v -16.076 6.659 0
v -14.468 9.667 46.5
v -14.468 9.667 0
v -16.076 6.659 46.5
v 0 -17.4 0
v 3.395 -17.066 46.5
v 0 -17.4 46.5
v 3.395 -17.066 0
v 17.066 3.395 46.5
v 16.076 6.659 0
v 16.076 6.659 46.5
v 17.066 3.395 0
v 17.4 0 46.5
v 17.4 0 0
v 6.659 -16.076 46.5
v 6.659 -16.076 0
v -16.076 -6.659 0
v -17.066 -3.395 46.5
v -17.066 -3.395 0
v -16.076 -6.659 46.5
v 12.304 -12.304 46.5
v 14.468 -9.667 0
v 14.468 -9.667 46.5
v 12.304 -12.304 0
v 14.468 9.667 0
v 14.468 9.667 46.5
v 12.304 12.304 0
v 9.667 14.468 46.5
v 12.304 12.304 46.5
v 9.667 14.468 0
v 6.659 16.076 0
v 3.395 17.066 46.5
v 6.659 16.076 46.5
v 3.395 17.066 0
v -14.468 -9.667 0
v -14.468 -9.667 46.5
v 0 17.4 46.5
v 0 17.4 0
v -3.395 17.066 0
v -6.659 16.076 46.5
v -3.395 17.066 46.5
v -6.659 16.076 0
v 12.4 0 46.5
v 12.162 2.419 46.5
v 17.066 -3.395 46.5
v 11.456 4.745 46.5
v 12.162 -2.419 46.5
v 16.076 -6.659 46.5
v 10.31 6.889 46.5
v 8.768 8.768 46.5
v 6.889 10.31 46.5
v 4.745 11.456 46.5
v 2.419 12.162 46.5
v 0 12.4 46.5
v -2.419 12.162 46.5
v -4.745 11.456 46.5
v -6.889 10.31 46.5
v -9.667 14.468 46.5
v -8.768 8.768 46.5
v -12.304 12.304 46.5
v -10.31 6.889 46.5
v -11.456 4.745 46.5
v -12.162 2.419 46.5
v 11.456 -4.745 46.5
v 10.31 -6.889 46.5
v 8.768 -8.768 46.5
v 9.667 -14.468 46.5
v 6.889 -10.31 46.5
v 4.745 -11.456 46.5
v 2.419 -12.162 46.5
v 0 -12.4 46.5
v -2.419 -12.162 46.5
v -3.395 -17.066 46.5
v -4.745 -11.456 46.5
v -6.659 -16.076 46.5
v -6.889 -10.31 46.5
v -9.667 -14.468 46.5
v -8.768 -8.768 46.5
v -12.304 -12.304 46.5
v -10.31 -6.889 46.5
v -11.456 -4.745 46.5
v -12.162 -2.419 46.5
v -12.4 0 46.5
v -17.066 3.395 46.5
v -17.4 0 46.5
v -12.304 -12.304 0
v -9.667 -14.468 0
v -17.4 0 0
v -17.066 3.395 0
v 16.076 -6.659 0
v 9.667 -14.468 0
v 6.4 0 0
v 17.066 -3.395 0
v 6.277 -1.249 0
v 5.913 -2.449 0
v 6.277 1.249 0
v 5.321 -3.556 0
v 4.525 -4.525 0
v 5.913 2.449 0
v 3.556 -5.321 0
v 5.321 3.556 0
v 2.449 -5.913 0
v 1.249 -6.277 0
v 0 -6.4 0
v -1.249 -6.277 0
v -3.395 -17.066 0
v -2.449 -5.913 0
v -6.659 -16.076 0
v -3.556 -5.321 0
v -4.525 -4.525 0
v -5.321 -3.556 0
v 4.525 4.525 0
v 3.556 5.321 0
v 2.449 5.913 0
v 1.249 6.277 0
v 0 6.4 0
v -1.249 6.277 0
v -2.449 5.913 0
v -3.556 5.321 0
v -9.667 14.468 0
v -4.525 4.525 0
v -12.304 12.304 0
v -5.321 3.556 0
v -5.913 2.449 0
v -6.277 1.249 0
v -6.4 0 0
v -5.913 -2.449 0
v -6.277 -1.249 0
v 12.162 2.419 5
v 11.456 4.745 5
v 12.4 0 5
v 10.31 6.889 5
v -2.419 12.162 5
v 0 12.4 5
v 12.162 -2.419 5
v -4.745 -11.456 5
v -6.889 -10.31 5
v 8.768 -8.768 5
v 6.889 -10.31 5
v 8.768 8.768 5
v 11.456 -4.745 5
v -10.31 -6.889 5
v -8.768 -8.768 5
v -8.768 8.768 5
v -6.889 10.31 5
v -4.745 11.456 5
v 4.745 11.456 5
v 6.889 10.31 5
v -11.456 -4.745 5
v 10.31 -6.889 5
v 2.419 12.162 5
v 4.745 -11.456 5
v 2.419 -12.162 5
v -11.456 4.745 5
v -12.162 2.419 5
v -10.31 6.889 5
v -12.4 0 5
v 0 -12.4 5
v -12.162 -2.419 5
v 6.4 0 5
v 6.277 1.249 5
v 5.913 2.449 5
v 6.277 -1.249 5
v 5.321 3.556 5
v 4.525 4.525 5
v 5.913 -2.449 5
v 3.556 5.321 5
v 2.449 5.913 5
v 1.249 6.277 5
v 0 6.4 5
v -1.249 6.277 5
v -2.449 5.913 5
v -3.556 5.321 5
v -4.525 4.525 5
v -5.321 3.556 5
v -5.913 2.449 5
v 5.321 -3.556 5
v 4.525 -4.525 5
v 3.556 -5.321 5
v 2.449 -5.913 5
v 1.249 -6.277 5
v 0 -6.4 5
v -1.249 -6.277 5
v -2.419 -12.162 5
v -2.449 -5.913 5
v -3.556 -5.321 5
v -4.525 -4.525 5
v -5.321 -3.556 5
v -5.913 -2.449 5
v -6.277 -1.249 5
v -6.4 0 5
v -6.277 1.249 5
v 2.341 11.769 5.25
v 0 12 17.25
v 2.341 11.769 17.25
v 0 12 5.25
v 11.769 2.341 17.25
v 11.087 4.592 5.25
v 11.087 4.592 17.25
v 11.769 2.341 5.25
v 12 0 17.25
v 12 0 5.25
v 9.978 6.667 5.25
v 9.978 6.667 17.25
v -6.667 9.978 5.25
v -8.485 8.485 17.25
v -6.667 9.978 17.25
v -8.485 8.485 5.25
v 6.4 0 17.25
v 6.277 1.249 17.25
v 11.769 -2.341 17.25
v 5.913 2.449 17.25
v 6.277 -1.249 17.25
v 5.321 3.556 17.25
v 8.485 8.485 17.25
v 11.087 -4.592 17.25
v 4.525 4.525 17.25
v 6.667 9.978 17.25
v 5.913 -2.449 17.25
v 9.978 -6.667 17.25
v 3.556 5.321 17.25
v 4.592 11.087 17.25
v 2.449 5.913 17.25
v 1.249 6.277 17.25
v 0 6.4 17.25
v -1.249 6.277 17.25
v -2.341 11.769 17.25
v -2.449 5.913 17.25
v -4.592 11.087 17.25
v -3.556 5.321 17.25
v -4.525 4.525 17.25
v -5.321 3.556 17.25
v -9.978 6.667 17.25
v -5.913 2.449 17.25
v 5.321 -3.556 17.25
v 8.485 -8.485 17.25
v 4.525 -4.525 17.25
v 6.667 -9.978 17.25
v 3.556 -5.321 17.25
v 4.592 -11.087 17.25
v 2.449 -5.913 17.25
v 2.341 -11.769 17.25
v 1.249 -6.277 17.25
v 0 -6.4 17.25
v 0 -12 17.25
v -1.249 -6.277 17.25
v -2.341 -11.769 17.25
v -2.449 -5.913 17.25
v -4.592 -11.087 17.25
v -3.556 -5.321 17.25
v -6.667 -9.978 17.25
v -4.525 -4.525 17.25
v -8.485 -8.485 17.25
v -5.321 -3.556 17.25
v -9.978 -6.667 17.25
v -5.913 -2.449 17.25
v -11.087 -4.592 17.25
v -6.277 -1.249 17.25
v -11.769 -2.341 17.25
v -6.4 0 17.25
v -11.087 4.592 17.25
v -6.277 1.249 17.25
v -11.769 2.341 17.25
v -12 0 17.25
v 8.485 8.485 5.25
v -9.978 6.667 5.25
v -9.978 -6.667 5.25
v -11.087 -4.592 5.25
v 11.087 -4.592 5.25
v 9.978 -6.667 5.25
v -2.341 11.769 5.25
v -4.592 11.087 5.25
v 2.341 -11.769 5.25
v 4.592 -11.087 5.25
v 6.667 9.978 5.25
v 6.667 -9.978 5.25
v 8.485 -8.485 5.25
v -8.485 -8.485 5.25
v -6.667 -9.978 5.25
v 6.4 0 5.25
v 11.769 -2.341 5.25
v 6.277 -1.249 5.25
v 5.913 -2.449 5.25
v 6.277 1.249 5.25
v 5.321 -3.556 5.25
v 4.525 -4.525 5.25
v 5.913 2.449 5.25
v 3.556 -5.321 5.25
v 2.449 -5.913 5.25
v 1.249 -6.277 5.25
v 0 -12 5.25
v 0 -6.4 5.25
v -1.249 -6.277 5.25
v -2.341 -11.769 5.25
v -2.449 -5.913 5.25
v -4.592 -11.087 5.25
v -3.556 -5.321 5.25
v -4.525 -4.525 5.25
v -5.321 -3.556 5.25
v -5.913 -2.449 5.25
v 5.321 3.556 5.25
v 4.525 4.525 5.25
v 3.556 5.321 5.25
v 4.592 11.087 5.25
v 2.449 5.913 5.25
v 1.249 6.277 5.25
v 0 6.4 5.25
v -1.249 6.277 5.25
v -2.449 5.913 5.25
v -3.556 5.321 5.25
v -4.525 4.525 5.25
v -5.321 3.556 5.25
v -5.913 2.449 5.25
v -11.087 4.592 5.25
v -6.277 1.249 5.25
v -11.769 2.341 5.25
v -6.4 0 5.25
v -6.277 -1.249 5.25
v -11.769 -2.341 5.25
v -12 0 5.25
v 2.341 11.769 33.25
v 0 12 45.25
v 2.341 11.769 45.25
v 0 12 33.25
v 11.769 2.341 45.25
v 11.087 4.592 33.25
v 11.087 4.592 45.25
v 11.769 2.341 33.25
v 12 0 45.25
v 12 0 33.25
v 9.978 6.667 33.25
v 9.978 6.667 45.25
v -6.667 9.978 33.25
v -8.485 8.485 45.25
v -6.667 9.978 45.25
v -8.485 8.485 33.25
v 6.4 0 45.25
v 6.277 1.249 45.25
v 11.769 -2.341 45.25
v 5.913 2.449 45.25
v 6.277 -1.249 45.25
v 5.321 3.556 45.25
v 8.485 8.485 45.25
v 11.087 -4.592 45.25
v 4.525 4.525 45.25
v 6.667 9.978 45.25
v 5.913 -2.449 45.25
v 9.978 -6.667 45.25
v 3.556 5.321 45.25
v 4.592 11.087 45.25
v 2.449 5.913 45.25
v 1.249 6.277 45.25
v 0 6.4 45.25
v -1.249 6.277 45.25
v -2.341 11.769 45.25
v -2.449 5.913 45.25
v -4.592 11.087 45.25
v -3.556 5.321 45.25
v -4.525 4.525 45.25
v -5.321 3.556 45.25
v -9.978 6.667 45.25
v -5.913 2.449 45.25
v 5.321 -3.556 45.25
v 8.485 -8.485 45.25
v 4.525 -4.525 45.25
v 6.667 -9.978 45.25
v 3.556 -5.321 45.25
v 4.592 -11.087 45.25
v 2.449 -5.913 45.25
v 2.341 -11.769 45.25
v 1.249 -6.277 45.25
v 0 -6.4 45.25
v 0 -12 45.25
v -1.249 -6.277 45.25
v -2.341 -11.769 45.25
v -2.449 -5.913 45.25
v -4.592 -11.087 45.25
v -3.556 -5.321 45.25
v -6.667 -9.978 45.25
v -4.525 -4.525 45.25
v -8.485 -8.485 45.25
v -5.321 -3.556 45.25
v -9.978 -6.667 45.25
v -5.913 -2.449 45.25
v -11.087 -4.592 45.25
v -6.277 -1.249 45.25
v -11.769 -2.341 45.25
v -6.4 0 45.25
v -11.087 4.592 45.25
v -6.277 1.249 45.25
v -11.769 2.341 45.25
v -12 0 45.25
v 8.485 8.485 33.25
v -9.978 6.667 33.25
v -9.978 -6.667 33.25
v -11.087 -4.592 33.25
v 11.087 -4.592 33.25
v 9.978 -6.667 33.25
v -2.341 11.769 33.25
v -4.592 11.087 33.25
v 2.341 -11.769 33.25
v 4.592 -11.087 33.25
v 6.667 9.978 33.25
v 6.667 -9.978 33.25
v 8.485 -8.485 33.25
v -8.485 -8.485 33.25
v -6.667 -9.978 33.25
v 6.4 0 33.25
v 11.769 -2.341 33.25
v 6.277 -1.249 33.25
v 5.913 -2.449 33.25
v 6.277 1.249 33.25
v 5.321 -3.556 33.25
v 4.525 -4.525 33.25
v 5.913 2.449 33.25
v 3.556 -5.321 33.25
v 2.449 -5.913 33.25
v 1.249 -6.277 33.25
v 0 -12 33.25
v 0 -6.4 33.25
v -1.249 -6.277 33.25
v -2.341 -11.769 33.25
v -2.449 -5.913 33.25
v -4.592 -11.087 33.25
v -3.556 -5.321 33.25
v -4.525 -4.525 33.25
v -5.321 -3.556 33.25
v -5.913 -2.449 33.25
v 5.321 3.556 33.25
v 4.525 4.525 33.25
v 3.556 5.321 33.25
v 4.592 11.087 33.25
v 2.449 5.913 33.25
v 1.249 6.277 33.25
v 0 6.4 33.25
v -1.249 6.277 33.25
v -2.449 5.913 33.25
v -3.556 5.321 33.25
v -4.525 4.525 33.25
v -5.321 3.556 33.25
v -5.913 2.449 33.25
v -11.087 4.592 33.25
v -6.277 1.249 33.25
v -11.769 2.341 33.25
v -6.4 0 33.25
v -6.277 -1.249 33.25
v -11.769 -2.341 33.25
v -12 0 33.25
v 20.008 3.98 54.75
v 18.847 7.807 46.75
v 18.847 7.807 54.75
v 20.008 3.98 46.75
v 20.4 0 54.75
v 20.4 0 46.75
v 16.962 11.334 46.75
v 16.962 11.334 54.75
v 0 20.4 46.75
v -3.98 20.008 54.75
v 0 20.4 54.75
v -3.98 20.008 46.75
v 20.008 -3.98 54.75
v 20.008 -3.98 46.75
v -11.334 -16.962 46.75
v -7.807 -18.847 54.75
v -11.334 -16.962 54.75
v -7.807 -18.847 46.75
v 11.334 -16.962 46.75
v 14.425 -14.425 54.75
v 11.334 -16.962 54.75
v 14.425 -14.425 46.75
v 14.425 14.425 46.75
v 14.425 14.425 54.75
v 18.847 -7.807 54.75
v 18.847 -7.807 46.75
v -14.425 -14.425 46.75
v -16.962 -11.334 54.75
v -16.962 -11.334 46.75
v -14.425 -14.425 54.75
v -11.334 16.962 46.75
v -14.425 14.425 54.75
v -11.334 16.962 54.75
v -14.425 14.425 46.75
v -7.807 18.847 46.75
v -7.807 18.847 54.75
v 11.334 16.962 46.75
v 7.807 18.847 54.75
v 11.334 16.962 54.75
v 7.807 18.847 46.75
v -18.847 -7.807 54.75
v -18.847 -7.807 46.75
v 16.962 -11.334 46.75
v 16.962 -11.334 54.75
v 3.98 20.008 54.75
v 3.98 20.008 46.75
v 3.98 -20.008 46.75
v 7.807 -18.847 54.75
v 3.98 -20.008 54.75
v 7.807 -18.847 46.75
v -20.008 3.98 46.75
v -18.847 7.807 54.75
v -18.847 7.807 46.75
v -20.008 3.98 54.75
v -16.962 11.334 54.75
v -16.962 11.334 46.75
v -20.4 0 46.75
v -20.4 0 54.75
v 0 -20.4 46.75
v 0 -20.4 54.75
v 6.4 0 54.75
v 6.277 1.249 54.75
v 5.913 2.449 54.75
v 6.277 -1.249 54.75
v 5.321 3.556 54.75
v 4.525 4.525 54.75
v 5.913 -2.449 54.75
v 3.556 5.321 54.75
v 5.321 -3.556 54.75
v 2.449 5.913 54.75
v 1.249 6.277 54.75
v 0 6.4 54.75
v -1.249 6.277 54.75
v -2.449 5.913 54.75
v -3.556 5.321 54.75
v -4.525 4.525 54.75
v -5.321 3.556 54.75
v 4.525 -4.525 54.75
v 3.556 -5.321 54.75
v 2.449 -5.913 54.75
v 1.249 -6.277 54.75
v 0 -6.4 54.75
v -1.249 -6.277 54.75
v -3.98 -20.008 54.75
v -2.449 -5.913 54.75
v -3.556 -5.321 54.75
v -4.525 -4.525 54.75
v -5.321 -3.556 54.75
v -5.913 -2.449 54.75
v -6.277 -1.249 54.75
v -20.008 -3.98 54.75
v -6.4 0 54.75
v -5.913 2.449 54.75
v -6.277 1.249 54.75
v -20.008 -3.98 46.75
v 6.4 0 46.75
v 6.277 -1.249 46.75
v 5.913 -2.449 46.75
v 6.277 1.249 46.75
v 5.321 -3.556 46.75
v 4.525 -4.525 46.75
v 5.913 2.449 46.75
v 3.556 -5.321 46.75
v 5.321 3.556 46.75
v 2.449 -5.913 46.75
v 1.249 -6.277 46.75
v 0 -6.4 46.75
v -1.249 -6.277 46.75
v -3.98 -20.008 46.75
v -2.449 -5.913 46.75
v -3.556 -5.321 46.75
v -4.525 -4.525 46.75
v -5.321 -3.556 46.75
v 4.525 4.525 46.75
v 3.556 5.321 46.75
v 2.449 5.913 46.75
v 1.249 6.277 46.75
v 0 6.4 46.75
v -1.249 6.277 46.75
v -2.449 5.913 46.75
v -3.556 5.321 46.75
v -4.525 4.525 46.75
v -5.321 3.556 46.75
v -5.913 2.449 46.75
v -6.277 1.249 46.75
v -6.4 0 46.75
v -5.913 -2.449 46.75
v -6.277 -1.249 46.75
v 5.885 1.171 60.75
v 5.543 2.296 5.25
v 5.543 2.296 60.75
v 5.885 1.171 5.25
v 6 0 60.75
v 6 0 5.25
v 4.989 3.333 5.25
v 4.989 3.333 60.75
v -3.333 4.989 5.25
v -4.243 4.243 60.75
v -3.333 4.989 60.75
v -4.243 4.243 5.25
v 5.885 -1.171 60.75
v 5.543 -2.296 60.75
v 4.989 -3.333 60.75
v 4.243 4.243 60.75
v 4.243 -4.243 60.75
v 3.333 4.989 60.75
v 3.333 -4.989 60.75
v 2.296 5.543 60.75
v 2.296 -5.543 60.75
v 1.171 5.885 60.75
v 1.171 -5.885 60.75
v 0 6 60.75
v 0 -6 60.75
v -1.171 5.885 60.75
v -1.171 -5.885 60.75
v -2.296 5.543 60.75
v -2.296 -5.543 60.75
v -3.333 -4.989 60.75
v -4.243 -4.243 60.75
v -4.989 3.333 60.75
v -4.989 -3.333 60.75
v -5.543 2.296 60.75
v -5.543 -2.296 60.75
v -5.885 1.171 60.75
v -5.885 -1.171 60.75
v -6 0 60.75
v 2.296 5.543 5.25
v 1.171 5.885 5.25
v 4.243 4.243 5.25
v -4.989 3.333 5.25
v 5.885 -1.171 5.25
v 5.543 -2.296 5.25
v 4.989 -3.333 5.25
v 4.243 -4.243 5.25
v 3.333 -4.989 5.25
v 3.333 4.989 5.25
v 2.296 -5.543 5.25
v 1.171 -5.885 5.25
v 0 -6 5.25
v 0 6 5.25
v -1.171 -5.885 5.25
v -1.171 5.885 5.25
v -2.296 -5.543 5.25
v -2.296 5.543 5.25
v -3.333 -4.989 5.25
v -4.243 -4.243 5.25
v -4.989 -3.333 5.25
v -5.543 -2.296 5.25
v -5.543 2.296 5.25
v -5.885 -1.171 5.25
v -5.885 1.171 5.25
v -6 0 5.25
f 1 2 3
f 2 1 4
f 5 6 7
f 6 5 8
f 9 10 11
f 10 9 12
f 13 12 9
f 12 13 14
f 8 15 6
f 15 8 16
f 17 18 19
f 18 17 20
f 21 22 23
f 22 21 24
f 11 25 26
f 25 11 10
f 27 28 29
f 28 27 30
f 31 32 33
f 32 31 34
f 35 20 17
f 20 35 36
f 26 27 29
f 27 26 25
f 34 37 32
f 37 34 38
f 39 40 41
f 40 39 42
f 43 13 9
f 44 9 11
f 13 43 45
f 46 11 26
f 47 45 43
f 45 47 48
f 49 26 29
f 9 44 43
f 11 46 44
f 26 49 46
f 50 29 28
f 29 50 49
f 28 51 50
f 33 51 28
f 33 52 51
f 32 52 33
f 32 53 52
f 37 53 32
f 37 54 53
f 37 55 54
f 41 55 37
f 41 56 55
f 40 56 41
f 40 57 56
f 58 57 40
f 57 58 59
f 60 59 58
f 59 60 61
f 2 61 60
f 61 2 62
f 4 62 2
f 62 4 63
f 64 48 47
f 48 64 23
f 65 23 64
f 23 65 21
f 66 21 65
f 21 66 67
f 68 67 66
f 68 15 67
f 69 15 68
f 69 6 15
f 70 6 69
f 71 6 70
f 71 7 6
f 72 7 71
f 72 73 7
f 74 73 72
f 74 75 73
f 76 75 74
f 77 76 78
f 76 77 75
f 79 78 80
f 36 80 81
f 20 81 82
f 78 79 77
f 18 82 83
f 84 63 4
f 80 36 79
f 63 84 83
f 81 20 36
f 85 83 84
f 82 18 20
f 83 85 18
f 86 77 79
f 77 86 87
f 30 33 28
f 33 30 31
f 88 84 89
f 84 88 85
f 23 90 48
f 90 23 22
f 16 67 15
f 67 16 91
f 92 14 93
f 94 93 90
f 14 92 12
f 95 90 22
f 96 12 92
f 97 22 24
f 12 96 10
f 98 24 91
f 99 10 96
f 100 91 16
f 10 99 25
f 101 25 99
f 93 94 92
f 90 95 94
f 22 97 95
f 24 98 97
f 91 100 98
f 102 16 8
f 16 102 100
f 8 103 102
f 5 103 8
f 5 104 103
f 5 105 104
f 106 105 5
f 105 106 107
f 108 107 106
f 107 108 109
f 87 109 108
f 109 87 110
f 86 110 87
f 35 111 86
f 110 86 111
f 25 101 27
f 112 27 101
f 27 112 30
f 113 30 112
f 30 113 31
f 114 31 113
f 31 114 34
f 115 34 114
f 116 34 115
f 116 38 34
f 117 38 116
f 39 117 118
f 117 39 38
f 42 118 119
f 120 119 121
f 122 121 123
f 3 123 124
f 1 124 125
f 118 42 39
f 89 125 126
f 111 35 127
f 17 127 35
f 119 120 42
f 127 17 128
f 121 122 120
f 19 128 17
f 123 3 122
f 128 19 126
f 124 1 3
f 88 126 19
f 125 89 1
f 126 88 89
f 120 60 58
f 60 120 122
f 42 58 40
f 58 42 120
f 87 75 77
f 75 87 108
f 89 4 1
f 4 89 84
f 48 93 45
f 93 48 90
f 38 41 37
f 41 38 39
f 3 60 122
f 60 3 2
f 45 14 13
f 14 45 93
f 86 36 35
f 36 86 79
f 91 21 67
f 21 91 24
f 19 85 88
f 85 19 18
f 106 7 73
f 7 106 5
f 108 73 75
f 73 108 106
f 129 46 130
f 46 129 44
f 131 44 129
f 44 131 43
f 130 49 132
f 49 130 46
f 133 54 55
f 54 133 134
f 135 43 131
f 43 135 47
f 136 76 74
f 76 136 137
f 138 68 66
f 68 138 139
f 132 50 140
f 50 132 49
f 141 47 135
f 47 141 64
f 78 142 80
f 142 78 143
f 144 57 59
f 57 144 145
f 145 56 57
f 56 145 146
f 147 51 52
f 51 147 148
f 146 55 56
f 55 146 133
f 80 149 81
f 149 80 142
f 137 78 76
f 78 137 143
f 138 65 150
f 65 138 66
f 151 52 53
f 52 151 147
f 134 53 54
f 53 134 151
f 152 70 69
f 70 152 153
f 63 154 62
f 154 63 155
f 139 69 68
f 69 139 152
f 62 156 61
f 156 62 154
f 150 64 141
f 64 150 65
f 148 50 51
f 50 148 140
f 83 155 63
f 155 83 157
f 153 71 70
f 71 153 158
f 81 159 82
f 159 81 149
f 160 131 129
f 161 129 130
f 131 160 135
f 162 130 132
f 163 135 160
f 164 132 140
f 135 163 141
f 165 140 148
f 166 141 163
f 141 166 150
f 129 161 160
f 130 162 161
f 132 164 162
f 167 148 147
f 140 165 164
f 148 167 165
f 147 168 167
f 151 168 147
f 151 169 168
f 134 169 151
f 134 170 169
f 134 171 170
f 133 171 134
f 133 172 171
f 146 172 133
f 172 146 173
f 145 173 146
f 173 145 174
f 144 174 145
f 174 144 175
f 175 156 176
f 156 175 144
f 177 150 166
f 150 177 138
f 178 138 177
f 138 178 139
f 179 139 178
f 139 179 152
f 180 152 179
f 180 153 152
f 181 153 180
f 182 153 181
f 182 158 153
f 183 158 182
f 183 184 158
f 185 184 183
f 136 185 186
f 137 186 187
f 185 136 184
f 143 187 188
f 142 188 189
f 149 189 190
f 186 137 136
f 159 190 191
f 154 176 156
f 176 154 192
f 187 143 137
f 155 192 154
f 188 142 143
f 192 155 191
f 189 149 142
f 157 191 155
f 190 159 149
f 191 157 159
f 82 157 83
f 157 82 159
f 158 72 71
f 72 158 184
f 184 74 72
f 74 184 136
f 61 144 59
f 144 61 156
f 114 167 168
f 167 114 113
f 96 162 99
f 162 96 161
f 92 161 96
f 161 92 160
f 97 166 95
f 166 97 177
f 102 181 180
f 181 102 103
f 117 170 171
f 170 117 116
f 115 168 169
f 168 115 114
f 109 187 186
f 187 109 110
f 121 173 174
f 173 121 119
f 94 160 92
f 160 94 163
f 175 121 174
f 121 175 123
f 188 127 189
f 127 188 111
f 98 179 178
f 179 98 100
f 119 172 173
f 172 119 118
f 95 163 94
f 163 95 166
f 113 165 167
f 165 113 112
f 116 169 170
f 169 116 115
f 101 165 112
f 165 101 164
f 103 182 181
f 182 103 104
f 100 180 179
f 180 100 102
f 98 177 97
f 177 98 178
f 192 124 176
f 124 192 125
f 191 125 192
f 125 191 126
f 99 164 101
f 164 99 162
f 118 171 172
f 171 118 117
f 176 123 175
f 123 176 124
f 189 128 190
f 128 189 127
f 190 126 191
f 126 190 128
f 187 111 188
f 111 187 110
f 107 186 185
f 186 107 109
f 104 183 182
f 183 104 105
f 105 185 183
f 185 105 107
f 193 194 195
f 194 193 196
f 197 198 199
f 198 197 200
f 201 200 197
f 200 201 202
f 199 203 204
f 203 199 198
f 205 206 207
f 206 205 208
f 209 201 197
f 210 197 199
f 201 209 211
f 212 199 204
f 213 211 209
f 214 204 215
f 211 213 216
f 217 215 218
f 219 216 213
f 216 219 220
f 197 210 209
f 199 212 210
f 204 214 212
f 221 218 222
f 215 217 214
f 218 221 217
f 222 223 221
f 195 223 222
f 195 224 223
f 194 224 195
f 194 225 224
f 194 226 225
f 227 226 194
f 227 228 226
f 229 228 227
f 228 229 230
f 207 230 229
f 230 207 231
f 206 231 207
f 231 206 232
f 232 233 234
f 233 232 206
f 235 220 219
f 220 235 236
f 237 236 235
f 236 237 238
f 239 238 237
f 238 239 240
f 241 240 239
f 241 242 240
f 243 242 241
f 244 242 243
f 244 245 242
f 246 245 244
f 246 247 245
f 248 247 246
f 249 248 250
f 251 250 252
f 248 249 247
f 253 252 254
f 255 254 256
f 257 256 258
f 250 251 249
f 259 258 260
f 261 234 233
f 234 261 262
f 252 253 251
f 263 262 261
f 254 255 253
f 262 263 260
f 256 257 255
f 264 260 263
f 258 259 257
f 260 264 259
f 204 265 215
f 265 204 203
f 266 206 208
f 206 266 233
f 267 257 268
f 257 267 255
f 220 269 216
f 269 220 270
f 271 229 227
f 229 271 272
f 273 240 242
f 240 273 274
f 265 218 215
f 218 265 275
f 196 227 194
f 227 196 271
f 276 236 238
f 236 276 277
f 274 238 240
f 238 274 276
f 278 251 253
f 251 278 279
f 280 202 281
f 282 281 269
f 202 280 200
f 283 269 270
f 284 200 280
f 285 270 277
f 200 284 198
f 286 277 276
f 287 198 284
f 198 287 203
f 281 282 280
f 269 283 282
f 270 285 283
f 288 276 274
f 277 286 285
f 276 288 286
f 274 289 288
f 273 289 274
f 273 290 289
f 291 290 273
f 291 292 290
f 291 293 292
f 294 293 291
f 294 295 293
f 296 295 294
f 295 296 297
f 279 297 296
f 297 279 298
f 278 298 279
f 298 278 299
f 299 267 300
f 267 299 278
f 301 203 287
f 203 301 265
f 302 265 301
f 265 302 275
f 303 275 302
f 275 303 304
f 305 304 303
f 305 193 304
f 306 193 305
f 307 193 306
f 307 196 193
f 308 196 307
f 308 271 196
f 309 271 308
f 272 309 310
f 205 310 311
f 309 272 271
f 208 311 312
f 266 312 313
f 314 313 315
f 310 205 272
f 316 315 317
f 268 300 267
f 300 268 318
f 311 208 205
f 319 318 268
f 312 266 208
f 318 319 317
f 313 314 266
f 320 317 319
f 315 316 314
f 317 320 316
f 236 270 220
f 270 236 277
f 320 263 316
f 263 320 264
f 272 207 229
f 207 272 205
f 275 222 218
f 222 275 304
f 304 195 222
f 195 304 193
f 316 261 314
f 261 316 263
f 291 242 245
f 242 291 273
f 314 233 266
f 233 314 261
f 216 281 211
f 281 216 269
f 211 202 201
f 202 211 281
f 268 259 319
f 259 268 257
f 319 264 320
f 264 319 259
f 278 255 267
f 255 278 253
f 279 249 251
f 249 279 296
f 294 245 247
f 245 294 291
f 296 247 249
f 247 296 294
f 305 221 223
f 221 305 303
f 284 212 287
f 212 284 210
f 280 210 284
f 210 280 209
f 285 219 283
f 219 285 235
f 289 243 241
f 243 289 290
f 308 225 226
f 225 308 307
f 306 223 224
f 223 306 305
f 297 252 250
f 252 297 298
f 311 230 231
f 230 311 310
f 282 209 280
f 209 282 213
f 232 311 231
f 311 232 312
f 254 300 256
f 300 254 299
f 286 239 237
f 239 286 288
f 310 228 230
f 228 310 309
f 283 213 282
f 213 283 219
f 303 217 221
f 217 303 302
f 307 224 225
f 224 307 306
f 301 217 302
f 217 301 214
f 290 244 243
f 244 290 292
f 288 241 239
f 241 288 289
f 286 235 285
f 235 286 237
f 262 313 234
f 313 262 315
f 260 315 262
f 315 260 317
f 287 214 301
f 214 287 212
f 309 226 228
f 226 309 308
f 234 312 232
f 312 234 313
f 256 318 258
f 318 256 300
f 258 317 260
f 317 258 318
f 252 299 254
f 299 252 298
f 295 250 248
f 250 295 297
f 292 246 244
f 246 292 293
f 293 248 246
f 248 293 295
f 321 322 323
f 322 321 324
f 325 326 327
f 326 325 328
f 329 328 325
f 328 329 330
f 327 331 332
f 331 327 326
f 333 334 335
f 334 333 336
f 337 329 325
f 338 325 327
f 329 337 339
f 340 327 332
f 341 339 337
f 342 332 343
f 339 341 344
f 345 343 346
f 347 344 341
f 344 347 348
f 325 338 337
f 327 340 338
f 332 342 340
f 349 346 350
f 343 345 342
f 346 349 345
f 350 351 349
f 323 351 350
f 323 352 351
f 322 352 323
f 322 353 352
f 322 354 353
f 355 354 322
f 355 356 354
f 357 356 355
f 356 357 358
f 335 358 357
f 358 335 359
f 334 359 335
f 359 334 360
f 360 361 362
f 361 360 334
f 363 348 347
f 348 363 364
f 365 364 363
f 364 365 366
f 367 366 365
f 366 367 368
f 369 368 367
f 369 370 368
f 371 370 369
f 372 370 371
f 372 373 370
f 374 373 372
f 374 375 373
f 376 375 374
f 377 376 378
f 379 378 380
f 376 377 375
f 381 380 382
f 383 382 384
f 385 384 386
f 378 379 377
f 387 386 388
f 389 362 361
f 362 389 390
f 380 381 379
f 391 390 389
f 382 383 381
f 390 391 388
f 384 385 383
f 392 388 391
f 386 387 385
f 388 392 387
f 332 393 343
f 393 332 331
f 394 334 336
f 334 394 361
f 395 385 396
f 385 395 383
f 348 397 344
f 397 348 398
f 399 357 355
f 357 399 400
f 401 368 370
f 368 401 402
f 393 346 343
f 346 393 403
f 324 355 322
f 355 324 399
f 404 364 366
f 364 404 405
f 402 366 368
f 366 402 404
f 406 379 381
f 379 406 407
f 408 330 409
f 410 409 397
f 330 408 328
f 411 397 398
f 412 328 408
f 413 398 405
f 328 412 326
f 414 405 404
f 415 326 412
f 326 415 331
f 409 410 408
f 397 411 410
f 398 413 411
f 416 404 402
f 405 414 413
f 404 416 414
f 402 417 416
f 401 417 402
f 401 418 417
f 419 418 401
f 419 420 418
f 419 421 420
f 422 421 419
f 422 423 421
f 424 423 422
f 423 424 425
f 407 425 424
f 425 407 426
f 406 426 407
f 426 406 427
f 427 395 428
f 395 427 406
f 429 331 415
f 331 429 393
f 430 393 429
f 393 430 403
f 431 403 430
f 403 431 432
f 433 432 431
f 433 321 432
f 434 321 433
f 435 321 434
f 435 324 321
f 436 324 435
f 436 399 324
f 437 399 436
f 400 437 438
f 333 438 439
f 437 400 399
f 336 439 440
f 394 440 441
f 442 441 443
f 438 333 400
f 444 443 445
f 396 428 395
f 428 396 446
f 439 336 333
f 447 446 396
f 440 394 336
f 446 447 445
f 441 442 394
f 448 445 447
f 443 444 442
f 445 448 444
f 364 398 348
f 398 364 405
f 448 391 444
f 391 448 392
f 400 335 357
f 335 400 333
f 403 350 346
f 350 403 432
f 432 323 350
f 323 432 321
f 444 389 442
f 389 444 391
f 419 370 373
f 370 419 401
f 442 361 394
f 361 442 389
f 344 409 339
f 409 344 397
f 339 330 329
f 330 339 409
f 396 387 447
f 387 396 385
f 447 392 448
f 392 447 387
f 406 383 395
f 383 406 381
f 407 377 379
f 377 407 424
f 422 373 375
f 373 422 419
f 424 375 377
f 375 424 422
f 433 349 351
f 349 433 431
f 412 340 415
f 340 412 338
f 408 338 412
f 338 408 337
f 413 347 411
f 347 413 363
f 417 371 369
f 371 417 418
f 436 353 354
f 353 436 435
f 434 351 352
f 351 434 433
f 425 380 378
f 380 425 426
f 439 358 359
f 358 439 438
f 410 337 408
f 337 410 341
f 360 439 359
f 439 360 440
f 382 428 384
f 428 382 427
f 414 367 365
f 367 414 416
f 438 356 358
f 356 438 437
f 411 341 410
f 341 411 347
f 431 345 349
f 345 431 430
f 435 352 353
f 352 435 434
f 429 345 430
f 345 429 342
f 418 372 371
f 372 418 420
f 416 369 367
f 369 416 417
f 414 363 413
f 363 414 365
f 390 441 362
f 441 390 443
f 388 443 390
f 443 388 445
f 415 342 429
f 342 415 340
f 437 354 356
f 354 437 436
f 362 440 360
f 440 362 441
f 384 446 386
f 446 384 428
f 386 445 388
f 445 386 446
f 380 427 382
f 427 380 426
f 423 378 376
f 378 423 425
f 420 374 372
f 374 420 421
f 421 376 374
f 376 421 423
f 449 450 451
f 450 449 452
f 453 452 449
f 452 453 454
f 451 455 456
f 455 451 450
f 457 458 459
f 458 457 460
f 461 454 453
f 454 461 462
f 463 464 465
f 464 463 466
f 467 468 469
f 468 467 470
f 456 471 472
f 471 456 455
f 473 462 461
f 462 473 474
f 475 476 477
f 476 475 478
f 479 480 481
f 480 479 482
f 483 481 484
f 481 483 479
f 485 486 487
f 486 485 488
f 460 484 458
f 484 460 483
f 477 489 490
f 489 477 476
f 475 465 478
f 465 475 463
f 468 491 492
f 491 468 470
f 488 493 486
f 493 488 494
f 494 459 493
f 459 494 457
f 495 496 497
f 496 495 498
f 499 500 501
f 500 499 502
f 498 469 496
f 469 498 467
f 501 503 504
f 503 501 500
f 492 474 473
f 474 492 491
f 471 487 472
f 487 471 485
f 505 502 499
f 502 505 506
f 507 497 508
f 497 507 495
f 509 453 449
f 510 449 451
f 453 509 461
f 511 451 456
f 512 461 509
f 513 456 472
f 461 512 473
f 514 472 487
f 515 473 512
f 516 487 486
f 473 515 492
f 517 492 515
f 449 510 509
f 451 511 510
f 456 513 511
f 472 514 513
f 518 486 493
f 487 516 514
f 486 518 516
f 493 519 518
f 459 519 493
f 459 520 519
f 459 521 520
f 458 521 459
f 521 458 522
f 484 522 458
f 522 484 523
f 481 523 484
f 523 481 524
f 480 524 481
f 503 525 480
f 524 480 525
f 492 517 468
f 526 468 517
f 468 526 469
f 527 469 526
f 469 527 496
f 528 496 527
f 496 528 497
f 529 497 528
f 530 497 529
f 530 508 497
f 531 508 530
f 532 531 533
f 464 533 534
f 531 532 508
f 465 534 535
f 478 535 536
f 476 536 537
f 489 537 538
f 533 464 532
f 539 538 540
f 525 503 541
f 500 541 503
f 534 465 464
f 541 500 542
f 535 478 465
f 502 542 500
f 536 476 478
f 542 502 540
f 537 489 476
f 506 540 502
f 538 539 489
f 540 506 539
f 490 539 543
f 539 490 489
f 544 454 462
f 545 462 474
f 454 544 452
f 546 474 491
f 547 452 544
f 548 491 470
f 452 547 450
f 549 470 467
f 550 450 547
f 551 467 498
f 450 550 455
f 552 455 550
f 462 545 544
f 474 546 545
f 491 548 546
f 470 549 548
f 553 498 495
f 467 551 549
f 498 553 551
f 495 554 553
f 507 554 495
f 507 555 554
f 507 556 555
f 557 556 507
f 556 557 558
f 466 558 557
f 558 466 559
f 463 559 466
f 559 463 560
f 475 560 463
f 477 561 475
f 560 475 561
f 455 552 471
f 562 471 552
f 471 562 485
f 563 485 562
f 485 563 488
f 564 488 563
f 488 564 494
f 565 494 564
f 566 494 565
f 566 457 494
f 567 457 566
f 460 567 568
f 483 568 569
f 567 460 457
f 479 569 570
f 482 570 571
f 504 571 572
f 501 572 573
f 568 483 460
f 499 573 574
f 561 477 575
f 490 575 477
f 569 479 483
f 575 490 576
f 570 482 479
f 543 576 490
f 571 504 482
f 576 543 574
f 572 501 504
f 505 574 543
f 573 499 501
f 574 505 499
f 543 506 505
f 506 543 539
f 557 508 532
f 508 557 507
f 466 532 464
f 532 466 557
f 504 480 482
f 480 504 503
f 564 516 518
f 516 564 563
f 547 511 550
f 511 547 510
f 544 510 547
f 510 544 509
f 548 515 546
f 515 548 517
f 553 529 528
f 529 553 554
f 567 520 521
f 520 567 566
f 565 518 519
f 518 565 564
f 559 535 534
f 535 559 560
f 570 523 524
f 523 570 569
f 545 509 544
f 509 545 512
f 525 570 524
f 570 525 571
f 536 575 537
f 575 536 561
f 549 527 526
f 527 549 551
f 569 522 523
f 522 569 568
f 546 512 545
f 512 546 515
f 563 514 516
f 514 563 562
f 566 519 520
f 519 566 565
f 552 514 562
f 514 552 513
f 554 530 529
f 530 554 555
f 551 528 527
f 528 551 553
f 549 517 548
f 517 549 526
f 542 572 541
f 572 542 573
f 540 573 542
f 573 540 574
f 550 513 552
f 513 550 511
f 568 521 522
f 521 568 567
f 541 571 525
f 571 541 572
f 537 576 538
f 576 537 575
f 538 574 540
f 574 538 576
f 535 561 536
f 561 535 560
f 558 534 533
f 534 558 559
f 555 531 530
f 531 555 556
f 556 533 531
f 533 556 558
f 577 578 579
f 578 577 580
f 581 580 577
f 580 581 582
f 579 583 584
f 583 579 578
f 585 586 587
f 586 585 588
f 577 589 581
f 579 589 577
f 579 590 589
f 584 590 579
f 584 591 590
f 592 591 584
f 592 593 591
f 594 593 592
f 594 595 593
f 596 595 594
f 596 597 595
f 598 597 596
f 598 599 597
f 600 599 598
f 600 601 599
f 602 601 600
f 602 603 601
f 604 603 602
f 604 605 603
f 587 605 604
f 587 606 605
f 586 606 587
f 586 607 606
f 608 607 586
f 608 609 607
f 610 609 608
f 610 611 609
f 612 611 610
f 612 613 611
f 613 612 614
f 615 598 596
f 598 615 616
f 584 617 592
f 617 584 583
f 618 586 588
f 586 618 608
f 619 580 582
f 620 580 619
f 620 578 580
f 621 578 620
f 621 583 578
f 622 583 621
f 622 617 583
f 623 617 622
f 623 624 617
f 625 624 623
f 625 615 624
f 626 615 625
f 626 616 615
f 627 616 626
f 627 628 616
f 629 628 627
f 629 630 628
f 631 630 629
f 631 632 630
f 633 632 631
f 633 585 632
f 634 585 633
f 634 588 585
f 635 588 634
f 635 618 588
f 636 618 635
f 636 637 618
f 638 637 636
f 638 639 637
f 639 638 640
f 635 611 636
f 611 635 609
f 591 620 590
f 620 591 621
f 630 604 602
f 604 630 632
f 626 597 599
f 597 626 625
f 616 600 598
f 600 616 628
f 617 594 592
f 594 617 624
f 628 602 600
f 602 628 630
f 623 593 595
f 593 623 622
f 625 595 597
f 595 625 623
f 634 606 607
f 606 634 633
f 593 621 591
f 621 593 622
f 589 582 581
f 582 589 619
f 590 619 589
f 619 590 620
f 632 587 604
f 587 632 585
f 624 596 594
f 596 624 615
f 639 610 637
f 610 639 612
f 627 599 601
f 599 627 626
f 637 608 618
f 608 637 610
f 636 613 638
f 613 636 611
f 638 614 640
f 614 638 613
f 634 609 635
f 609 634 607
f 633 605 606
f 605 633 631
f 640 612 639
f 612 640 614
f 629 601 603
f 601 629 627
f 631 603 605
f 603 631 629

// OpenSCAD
$fn = 32;

// ------------------------------------------------------------------------
// Shaft station: cup d34.8 x 46.5 mm, shaft d12
// Every part is its own module, assembly() places every instance.
// ------------------------------------------------------------------------

// --- part 1 ---
module housing_cup() {
  difference() {
    cylinder(h = 46.5, d = 34.8);
    translate([0, 0, 5]) cylinder(h = 42.5, d = 24.8);
    translate([0, 0, -1]) cylinder(h = 7, d = 12.8);
  }
}

// --- part 2 ---
module bearing_lower() {
  difference() {
      translate([0, 0, 0]) cylinder(h = 12, d = 24);
      translate([0, 0, -1]) cylinder(h = 14, d = 12.8);
    }
}

// --- part 3 ---
module bearing_upper() {
  difference() {
      translate([0, 0, 0]) cylinder(h = 12, d = 24);
      translate([0, 0, -1]) cylinder(h = 14, d = 12.8);
    }
}

// --- part 4 ---
module station_shaft() {
  translate([0, 0, -27.75]) cylinder(h = 55.5, d = 12);
}

// --- part 5 ---
module station_cover() {
  difference() {
    cylinder(h = 8, d = 40.8);
    translate([0, 0, -1]) cylinder(h = 10, d = 12.8);
  }
}

// --- assembly ---
module assembly() {
  color([0.80, 0.24, 0.20]) translate([0, 0, 0]) rotate([0, 0, 0]) housing_cup();
  color([0.20, 0.45, 0.75]) translate([0, 0, 5.25]) rotate([0, 0, 0]) bearing_lower();
  color([0.25, 0.62, 0.32]) translate([0, 0, 33.25]) rotate([0, 0, 0]) bearing_upper();
  color([0.92, 0.70, 0.18]) translate([0, 0, 33]) rotate([0, 0, 0]) station_shaft();
  color([0.58, 0.35, 0.70]) translate([0, 0, 46.75]) rotate([0, 0, 0]) station_cover();
}

assembly();
